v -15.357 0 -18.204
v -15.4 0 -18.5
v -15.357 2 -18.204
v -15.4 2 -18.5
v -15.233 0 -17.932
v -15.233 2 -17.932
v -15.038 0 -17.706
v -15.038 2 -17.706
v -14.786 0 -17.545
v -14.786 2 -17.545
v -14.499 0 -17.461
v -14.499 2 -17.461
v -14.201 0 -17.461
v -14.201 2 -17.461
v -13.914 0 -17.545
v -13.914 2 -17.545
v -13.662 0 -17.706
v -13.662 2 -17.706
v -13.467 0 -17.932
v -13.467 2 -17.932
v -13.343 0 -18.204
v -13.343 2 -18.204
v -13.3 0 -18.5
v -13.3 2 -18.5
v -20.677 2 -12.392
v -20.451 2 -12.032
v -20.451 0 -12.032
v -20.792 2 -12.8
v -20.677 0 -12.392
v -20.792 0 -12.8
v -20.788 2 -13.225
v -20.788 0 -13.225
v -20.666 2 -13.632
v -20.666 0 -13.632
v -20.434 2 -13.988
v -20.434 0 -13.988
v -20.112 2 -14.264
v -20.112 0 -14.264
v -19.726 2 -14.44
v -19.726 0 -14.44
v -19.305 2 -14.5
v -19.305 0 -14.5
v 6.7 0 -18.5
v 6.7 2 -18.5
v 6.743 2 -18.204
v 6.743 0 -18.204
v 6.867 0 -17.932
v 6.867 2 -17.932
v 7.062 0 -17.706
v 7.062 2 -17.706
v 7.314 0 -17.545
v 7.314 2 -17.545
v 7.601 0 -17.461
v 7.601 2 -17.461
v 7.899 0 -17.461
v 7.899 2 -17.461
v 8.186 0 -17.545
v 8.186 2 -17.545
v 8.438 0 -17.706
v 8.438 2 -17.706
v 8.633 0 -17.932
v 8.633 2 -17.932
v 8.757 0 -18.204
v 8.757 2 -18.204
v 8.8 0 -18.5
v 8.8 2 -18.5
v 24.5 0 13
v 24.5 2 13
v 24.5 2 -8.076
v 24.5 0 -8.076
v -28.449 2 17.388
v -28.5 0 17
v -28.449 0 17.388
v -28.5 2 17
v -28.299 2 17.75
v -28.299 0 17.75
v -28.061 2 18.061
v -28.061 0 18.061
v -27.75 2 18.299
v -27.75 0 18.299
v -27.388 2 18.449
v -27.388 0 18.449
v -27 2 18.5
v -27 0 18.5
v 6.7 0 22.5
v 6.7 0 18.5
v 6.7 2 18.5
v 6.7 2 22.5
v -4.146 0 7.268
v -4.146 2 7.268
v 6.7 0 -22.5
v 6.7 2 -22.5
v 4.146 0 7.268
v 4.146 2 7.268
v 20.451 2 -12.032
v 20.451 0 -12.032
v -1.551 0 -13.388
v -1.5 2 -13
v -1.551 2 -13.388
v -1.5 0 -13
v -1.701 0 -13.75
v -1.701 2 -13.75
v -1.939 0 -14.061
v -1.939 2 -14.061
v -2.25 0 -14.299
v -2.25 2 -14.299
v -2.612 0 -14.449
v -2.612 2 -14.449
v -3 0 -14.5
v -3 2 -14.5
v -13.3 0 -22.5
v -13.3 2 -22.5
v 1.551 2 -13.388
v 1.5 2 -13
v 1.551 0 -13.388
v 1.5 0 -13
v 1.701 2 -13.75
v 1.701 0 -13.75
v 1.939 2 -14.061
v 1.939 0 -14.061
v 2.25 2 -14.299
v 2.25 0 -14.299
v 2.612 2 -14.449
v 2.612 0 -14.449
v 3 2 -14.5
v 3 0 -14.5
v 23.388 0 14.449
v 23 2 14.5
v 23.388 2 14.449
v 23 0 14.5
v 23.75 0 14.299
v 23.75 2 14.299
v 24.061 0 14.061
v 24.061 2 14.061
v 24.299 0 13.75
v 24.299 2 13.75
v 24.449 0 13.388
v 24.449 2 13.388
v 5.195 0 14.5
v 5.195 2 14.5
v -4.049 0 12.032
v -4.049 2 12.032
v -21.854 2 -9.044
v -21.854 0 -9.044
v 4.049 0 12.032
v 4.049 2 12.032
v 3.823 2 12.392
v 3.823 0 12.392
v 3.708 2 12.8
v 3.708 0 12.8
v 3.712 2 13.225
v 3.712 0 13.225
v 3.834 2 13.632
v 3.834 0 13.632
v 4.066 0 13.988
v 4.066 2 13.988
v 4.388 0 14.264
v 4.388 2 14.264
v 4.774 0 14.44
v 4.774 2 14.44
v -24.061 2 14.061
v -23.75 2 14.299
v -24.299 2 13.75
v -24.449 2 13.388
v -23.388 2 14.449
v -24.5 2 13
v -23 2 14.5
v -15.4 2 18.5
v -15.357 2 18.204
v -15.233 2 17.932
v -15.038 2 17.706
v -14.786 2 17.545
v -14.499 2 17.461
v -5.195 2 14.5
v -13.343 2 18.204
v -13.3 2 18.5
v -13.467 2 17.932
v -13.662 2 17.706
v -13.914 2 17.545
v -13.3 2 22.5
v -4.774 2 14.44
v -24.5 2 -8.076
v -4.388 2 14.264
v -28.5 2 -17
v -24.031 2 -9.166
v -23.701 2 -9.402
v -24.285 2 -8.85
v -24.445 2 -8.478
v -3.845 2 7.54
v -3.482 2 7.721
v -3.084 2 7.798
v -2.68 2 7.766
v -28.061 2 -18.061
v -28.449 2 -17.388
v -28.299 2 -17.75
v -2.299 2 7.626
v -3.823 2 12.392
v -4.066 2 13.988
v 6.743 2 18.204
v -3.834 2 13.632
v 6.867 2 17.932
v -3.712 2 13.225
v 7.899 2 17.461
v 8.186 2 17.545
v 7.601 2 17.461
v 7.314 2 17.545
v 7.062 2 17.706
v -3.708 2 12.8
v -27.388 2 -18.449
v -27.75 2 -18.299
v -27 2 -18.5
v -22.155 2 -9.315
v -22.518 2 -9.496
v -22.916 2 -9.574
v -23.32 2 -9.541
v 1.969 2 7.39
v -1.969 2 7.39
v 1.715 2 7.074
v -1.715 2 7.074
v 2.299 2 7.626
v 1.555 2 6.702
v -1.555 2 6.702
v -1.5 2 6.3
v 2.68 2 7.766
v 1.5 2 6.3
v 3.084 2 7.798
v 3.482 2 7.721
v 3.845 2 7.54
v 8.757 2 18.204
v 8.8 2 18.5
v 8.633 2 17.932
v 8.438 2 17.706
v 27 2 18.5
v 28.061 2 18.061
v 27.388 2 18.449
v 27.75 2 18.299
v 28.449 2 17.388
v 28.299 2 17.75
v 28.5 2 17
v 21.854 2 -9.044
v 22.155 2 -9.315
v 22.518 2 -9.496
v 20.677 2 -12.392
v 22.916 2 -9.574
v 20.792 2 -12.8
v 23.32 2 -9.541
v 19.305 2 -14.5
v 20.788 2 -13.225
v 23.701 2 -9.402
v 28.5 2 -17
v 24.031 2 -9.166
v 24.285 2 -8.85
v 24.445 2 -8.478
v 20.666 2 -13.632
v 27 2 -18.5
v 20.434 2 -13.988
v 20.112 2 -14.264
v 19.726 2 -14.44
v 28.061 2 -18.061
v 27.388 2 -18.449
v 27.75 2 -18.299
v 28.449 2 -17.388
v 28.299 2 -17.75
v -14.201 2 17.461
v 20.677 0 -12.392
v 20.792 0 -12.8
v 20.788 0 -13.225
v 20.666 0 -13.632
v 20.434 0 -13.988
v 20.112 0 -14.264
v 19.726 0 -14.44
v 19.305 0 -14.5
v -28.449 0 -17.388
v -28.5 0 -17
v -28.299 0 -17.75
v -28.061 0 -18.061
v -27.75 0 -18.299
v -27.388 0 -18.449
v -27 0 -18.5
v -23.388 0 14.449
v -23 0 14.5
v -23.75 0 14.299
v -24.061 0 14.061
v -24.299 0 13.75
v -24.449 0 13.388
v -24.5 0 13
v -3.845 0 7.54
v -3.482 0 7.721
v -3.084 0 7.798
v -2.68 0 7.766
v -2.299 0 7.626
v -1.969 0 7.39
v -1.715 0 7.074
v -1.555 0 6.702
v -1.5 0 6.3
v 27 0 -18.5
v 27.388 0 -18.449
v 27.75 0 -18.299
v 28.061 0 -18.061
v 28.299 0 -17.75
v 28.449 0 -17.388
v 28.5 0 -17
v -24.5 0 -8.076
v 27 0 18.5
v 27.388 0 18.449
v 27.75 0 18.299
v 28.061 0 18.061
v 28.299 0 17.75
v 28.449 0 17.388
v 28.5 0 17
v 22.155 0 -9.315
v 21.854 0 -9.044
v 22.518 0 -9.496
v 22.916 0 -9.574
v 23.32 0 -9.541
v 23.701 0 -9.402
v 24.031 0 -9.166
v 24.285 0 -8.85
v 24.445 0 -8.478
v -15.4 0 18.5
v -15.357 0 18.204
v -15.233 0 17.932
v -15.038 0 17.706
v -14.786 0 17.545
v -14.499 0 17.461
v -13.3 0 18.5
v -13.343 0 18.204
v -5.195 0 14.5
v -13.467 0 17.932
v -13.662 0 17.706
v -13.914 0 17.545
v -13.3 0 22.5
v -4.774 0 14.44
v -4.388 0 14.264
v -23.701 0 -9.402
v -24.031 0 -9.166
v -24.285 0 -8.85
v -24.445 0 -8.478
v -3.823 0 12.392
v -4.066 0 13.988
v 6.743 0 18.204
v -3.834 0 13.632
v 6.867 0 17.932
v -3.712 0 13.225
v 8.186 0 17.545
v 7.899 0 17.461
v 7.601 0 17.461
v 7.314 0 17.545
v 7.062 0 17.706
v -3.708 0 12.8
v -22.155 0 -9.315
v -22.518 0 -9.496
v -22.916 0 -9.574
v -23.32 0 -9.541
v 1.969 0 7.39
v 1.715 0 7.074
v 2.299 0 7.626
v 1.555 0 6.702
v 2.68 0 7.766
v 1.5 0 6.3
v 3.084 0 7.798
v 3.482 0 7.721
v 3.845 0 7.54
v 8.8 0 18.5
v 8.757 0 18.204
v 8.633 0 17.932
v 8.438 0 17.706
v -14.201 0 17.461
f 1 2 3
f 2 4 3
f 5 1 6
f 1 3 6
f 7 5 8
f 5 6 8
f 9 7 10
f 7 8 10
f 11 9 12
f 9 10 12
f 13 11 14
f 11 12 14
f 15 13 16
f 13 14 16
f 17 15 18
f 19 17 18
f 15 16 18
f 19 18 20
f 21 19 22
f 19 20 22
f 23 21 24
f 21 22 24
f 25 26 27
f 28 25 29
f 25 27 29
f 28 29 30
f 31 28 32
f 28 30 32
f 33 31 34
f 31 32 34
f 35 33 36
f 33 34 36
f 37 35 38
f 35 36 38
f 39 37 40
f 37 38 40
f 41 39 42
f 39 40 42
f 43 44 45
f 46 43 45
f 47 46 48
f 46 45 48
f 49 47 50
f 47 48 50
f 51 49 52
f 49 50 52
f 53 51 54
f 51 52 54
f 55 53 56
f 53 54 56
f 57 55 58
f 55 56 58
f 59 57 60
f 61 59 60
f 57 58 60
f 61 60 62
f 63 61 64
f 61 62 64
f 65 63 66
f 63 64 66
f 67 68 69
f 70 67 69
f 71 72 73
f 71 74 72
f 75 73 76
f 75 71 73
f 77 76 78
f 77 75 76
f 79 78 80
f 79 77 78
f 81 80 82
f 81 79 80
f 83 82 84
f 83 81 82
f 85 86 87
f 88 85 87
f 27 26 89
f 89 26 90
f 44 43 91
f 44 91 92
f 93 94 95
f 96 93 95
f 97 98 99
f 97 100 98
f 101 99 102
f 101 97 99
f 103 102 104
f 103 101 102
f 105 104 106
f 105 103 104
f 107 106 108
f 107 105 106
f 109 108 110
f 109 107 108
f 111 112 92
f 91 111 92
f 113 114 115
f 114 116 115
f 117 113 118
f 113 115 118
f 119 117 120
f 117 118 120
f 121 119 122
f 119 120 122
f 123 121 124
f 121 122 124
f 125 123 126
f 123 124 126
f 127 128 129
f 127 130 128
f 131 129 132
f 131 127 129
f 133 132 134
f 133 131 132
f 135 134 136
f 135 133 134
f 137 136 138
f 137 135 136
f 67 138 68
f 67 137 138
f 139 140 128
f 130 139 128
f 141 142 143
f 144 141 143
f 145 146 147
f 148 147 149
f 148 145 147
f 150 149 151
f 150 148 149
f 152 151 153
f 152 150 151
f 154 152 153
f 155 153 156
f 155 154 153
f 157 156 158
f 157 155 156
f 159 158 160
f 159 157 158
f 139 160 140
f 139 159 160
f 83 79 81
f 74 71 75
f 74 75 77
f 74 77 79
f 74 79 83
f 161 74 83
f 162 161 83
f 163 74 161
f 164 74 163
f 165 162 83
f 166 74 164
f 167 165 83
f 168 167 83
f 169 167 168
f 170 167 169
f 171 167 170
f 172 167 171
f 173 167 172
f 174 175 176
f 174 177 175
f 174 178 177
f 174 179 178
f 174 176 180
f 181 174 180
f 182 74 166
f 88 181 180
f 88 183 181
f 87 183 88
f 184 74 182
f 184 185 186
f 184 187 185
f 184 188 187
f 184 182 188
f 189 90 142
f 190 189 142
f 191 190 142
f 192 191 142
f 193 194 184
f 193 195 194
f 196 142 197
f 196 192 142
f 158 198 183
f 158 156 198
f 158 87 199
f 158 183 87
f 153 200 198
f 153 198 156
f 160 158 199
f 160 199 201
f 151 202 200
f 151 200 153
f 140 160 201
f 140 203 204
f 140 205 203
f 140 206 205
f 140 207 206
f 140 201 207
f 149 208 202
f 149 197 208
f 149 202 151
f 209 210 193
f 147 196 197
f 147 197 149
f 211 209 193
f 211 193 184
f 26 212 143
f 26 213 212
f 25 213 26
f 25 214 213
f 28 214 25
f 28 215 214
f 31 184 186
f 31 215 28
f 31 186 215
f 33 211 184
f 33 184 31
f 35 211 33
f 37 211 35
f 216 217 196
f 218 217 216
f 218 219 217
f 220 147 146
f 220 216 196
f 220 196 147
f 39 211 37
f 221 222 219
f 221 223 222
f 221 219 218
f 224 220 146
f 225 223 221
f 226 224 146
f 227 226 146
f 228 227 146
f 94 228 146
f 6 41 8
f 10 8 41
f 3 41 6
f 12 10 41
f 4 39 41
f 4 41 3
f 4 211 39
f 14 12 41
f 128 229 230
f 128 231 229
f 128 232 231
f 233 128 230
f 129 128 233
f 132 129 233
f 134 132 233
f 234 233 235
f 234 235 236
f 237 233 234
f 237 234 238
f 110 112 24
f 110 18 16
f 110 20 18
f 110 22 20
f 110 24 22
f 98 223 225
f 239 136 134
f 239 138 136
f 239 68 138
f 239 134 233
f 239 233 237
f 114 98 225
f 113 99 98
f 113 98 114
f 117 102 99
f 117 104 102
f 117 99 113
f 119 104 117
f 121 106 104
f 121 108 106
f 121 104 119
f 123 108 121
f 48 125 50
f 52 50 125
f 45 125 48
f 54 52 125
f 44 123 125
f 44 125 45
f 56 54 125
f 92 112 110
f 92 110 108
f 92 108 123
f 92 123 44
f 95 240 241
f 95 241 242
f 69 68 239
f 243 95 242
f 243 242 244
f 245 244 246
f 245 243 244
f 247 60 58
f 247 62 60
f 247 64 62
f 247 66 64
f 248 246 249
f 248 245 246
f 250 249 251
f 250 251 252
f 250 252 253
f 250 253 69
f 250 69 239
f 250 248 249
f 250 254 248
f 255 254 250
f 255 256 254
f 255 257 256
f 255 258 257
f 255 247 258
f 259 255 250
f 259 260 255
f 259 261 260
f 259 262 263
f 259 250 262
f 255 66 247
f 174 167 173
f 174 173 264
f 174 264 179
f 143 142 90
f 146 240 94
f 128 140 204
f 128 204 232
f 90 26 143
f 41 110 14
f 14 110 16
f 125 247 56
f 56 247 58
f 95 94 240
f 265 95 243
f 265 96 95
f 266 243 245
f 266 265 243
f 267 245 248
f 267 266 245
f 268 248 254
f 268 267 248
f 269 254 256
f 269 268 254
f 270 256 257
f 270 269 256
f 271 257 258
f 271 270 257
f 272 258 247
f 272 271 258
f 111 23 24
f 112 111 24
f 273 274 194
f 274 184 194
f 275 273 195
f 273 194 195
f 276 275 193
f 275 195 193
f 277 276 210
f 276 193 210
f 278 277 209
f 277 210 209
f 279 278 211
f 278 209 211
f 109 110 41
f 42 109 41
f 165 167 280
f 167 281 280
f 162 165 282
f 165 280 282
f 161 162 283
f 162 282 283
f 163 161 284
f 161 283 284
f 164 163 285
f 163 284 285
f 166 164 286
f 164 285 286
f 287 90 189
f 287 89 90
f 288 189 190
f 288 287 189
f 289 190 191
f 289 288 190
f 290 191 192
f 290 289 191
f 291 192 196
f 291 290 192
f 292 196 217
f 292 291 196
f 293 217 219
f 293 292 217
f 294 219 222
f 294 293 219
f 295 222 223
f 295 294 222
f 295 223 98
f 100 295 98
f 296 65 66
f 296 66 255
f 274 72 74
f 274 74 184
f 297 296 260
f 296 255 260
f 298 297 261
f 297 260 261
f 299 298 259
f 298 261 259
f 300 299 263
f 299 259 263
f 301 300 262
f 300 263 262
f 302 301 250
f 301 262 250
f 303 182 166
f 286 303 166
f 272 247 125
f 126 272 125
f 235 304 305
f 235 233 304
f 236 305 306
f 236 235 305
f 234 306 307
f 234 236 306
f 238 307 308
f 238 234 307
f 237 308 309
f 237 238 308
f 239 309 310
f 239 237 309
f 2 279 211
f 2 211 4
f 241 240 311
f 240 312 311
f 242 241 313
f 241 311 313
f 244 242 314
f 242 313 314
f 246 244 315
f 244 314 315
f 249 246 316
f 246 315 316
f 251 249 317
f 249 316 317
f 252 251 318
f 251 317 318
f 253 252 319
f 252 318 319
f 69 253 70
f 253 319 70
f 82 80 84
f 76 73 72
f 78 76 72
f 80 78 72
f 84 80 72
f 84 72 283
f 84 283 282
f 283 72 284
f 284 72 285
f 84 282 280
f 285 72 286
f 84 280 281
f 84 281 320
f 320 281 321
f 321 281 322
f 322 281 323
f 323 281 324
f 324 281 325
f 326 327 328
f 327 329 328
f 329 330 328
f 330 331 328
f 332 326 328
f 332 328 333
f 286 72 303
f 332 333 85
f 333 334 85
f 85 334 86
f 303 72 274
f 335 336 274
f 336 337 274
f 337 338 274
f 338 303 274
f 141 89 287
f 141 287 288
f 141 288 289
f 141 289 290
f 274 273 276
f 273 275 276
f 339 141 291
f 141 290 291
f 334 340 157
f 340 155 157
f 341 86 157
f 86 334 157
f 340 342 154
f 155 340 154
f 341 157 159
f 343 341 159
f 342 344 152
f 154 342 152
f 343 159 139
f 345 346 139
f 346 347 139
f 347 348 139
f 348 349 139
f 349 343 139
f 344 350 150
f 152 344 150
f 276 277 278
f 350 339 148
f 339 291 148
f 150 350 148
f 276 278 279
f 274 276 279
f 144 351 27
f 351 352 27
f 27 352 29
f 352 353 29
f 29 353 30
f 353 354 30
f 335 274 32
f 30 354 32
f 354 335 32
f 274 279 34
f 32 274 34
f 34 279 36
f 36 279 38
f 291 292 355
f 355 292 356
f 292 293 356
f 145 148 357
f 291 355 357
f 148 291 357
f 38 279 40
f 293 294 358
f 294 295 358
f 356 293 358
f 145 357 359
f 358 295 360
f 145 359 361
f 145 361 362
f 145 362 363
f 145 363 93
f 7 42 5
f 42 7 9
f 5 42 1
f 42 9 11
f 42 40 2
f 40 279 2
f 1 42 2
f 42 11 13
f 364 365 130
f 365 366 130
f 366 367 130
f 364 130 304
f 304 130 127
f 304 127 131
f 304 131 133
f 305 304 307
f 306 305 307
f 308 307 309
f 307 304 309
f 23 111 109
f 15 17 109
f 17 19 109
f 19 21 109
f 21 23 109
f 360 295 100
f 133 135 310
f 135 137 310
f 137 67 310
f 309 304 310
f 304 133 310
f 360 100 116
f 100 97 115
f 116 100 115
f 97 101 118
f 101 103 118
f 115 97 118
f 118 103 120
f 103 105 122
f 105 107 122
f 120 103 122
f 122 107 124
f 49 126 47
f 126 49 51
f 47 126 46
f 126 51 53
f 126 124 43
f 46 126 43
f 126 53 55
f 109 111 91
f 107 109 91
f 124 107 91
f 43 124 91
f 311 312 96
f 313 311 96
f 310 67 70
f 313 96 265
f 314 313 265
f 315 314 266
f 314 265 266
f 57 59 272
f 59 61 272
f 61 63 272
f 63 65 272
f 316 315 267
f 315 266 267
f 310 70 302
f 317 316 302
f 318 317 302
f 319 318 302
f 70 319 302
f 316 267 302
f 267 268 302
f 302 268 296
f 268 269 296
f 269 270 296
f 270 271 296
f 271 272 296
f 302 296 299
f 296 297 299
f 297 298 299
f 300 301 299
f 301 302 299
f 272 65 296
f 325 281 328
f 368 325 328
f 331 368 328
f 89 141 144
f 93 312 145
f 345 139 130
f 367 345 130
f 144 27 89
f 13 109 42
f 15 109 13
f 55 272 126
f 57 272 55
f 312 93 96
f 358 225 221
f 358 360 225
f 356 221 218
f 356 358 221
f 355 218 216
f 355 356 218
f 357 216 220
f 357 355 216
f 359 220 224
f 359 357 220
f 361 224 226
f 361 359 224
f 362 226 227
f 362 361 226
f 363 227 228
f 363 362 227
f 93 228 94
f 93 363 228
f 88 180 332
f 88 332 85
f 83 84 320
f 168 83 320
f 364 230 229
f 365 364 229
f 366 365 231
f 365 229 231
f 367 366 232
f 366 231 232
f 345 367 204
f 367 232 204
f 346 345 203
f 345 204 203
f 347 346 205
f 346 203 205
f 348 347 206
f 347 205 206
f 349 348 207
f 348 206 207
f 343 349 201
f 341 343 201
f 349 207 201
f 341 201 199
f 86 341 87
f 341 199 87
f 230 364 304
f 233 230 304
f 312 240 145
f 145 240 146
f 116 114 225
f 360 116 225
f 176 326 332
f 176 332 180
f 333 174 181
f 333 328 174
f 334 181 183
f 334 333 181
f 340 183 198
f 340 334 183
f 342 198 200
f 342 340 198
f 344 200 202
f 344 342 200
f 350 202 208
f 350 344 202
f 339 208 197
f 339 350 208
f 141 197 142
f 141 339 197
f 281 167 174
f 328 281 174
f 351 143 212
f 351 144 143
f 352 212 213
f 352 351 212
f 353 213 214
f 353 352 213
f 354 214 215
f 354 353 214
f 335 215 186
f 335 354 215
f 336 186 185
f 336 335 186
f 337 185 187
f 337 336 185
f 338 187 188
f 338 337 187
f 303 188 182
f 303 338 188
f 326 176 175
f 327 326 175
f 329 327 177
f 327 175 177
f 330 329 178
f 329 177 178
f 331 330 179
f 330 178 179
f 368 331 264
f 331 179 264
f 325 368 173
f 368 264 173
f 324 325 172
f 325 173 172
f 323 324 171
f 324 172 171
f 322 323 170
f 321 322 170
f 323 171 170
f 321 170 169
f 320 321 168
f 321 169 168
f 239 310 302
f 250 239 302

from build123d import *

# Parameters (mm, degrees)
SKETCH_1_W          = 57
SKETCH_1_H          = 37
EXTRUDE_1_DEPTH     = 2
SKETCH_2_W          = 20
SKETCH_2_H          = 2
EXTRUDE_2_DEPTH     = 4
SKETCH_3_R          = 1.05
CUT_EXTRUDE_1_DEPTH = 4
CUT_EXTRUDE_2_DEPTH = 10
FILLET_1_R          = 1.5


with BuildPart() as part:
    # 草图1 → 凸台-拉伸1 (new body)
    with BuildSketch(Plane(origin=(0, 0, 0), x_dir=(1, 0, 0), z_dir=(0, 1, 0))):
        Rectangle(SKETCH_1_W, SKETCH_1_H)
    extrude(amount=EXTRUDE_1_DEPTH)

    # 草图2 → 凸台-拉伸2 (add)
    with BuildSketch(Plane.XY.offset(18.5)):
        with Locations((-3.3, 1)):
            Rectangle(SKETCH_2_W, SKETCH_2_H)
    extrude_2 = extrude(amount=EXTRUDE_2_DEPTH)

    # 镜向1: 凸台-拉伸2 across plane
    add(extrude_2.mirror(Plane.XY))

    # 草图3 → 切除-拉伸1 (cut)
    with BuildSketch(Plane(origin=(0, 2, 0), x_dir=(1, 0, 0), z_dir=(0, 1, 0))):
        with Locations((7.75, 18.5)):
            Circle(SKETCH_3_R)
        with Locations((-14.35, 18.5)):
            Circle(SKETCH_3_R)
        with Locations((-14.35, -18.5)):
            Circle(SKETCH_3_R)
        with Locations((7.75, -18.5)):
            Circle(SKETCH_3_R)
    extrude(amount=-CUT_EXTRUDE_1_DEPTH, mode=Mode.SUBTRACT)

    # 草图4 → 切除-拉伸2 (cut)
    with BuildSketch(Plane(origin=(0, 2, 0), x_dir=(1, 0, 0), z_dir=(0, 1, 0))):
        Polygon((-24.5, -14.5), (-1.963644752, -14.5), (-24.5, 12.175685803), align=None)
        Polygon((-22.536355248, 14.5), (-1.5, -10.400175599), (-1.5, 14.5), align=None)
        Polygon((1.5, 14.5), (1.5, -10.400175599), (22.536355248, 14.5), align=None)
        Polygon((24.5, 12.175685803), (1.963644752, -14.5), (24.5, -14.5), align=None)
    extrude(amount=-CUT_EXTRUDE_2_DEPTH, mode=Mode.SUBTRACT)

    # 圆角1
    fillet_1_edges = [part.edges().sort_by_distance(p)[0] for p in [
        (1.963644752, 1, 14.5),
        (24.5, 1, -12.175685803),
        (24.5, 1, 14.5),
        (-24.5, 1, -12.175685803),
        (-1.963644752, 1, 14.5),
        (-24.5, 1, 14.5),
        (28.5, 1, 18.5),
        (-28.5, 1, 18.5),
        (-28.5, 1, -18.5),
        (28.5, 1, -18.5),
        (-22.536355248, 1, -14.5),
        (-1.5, 1, -14.5),
        (-1.5, 1, 10.400175599),
        (1.5, 1, -14.5),
        (22.536355248, 1, -14.5),
        (1.5, 1, 10.400175599),
    ]]
    fillet(fillet_1_edges, radius=FILLET_1_R)


solid = part.part
